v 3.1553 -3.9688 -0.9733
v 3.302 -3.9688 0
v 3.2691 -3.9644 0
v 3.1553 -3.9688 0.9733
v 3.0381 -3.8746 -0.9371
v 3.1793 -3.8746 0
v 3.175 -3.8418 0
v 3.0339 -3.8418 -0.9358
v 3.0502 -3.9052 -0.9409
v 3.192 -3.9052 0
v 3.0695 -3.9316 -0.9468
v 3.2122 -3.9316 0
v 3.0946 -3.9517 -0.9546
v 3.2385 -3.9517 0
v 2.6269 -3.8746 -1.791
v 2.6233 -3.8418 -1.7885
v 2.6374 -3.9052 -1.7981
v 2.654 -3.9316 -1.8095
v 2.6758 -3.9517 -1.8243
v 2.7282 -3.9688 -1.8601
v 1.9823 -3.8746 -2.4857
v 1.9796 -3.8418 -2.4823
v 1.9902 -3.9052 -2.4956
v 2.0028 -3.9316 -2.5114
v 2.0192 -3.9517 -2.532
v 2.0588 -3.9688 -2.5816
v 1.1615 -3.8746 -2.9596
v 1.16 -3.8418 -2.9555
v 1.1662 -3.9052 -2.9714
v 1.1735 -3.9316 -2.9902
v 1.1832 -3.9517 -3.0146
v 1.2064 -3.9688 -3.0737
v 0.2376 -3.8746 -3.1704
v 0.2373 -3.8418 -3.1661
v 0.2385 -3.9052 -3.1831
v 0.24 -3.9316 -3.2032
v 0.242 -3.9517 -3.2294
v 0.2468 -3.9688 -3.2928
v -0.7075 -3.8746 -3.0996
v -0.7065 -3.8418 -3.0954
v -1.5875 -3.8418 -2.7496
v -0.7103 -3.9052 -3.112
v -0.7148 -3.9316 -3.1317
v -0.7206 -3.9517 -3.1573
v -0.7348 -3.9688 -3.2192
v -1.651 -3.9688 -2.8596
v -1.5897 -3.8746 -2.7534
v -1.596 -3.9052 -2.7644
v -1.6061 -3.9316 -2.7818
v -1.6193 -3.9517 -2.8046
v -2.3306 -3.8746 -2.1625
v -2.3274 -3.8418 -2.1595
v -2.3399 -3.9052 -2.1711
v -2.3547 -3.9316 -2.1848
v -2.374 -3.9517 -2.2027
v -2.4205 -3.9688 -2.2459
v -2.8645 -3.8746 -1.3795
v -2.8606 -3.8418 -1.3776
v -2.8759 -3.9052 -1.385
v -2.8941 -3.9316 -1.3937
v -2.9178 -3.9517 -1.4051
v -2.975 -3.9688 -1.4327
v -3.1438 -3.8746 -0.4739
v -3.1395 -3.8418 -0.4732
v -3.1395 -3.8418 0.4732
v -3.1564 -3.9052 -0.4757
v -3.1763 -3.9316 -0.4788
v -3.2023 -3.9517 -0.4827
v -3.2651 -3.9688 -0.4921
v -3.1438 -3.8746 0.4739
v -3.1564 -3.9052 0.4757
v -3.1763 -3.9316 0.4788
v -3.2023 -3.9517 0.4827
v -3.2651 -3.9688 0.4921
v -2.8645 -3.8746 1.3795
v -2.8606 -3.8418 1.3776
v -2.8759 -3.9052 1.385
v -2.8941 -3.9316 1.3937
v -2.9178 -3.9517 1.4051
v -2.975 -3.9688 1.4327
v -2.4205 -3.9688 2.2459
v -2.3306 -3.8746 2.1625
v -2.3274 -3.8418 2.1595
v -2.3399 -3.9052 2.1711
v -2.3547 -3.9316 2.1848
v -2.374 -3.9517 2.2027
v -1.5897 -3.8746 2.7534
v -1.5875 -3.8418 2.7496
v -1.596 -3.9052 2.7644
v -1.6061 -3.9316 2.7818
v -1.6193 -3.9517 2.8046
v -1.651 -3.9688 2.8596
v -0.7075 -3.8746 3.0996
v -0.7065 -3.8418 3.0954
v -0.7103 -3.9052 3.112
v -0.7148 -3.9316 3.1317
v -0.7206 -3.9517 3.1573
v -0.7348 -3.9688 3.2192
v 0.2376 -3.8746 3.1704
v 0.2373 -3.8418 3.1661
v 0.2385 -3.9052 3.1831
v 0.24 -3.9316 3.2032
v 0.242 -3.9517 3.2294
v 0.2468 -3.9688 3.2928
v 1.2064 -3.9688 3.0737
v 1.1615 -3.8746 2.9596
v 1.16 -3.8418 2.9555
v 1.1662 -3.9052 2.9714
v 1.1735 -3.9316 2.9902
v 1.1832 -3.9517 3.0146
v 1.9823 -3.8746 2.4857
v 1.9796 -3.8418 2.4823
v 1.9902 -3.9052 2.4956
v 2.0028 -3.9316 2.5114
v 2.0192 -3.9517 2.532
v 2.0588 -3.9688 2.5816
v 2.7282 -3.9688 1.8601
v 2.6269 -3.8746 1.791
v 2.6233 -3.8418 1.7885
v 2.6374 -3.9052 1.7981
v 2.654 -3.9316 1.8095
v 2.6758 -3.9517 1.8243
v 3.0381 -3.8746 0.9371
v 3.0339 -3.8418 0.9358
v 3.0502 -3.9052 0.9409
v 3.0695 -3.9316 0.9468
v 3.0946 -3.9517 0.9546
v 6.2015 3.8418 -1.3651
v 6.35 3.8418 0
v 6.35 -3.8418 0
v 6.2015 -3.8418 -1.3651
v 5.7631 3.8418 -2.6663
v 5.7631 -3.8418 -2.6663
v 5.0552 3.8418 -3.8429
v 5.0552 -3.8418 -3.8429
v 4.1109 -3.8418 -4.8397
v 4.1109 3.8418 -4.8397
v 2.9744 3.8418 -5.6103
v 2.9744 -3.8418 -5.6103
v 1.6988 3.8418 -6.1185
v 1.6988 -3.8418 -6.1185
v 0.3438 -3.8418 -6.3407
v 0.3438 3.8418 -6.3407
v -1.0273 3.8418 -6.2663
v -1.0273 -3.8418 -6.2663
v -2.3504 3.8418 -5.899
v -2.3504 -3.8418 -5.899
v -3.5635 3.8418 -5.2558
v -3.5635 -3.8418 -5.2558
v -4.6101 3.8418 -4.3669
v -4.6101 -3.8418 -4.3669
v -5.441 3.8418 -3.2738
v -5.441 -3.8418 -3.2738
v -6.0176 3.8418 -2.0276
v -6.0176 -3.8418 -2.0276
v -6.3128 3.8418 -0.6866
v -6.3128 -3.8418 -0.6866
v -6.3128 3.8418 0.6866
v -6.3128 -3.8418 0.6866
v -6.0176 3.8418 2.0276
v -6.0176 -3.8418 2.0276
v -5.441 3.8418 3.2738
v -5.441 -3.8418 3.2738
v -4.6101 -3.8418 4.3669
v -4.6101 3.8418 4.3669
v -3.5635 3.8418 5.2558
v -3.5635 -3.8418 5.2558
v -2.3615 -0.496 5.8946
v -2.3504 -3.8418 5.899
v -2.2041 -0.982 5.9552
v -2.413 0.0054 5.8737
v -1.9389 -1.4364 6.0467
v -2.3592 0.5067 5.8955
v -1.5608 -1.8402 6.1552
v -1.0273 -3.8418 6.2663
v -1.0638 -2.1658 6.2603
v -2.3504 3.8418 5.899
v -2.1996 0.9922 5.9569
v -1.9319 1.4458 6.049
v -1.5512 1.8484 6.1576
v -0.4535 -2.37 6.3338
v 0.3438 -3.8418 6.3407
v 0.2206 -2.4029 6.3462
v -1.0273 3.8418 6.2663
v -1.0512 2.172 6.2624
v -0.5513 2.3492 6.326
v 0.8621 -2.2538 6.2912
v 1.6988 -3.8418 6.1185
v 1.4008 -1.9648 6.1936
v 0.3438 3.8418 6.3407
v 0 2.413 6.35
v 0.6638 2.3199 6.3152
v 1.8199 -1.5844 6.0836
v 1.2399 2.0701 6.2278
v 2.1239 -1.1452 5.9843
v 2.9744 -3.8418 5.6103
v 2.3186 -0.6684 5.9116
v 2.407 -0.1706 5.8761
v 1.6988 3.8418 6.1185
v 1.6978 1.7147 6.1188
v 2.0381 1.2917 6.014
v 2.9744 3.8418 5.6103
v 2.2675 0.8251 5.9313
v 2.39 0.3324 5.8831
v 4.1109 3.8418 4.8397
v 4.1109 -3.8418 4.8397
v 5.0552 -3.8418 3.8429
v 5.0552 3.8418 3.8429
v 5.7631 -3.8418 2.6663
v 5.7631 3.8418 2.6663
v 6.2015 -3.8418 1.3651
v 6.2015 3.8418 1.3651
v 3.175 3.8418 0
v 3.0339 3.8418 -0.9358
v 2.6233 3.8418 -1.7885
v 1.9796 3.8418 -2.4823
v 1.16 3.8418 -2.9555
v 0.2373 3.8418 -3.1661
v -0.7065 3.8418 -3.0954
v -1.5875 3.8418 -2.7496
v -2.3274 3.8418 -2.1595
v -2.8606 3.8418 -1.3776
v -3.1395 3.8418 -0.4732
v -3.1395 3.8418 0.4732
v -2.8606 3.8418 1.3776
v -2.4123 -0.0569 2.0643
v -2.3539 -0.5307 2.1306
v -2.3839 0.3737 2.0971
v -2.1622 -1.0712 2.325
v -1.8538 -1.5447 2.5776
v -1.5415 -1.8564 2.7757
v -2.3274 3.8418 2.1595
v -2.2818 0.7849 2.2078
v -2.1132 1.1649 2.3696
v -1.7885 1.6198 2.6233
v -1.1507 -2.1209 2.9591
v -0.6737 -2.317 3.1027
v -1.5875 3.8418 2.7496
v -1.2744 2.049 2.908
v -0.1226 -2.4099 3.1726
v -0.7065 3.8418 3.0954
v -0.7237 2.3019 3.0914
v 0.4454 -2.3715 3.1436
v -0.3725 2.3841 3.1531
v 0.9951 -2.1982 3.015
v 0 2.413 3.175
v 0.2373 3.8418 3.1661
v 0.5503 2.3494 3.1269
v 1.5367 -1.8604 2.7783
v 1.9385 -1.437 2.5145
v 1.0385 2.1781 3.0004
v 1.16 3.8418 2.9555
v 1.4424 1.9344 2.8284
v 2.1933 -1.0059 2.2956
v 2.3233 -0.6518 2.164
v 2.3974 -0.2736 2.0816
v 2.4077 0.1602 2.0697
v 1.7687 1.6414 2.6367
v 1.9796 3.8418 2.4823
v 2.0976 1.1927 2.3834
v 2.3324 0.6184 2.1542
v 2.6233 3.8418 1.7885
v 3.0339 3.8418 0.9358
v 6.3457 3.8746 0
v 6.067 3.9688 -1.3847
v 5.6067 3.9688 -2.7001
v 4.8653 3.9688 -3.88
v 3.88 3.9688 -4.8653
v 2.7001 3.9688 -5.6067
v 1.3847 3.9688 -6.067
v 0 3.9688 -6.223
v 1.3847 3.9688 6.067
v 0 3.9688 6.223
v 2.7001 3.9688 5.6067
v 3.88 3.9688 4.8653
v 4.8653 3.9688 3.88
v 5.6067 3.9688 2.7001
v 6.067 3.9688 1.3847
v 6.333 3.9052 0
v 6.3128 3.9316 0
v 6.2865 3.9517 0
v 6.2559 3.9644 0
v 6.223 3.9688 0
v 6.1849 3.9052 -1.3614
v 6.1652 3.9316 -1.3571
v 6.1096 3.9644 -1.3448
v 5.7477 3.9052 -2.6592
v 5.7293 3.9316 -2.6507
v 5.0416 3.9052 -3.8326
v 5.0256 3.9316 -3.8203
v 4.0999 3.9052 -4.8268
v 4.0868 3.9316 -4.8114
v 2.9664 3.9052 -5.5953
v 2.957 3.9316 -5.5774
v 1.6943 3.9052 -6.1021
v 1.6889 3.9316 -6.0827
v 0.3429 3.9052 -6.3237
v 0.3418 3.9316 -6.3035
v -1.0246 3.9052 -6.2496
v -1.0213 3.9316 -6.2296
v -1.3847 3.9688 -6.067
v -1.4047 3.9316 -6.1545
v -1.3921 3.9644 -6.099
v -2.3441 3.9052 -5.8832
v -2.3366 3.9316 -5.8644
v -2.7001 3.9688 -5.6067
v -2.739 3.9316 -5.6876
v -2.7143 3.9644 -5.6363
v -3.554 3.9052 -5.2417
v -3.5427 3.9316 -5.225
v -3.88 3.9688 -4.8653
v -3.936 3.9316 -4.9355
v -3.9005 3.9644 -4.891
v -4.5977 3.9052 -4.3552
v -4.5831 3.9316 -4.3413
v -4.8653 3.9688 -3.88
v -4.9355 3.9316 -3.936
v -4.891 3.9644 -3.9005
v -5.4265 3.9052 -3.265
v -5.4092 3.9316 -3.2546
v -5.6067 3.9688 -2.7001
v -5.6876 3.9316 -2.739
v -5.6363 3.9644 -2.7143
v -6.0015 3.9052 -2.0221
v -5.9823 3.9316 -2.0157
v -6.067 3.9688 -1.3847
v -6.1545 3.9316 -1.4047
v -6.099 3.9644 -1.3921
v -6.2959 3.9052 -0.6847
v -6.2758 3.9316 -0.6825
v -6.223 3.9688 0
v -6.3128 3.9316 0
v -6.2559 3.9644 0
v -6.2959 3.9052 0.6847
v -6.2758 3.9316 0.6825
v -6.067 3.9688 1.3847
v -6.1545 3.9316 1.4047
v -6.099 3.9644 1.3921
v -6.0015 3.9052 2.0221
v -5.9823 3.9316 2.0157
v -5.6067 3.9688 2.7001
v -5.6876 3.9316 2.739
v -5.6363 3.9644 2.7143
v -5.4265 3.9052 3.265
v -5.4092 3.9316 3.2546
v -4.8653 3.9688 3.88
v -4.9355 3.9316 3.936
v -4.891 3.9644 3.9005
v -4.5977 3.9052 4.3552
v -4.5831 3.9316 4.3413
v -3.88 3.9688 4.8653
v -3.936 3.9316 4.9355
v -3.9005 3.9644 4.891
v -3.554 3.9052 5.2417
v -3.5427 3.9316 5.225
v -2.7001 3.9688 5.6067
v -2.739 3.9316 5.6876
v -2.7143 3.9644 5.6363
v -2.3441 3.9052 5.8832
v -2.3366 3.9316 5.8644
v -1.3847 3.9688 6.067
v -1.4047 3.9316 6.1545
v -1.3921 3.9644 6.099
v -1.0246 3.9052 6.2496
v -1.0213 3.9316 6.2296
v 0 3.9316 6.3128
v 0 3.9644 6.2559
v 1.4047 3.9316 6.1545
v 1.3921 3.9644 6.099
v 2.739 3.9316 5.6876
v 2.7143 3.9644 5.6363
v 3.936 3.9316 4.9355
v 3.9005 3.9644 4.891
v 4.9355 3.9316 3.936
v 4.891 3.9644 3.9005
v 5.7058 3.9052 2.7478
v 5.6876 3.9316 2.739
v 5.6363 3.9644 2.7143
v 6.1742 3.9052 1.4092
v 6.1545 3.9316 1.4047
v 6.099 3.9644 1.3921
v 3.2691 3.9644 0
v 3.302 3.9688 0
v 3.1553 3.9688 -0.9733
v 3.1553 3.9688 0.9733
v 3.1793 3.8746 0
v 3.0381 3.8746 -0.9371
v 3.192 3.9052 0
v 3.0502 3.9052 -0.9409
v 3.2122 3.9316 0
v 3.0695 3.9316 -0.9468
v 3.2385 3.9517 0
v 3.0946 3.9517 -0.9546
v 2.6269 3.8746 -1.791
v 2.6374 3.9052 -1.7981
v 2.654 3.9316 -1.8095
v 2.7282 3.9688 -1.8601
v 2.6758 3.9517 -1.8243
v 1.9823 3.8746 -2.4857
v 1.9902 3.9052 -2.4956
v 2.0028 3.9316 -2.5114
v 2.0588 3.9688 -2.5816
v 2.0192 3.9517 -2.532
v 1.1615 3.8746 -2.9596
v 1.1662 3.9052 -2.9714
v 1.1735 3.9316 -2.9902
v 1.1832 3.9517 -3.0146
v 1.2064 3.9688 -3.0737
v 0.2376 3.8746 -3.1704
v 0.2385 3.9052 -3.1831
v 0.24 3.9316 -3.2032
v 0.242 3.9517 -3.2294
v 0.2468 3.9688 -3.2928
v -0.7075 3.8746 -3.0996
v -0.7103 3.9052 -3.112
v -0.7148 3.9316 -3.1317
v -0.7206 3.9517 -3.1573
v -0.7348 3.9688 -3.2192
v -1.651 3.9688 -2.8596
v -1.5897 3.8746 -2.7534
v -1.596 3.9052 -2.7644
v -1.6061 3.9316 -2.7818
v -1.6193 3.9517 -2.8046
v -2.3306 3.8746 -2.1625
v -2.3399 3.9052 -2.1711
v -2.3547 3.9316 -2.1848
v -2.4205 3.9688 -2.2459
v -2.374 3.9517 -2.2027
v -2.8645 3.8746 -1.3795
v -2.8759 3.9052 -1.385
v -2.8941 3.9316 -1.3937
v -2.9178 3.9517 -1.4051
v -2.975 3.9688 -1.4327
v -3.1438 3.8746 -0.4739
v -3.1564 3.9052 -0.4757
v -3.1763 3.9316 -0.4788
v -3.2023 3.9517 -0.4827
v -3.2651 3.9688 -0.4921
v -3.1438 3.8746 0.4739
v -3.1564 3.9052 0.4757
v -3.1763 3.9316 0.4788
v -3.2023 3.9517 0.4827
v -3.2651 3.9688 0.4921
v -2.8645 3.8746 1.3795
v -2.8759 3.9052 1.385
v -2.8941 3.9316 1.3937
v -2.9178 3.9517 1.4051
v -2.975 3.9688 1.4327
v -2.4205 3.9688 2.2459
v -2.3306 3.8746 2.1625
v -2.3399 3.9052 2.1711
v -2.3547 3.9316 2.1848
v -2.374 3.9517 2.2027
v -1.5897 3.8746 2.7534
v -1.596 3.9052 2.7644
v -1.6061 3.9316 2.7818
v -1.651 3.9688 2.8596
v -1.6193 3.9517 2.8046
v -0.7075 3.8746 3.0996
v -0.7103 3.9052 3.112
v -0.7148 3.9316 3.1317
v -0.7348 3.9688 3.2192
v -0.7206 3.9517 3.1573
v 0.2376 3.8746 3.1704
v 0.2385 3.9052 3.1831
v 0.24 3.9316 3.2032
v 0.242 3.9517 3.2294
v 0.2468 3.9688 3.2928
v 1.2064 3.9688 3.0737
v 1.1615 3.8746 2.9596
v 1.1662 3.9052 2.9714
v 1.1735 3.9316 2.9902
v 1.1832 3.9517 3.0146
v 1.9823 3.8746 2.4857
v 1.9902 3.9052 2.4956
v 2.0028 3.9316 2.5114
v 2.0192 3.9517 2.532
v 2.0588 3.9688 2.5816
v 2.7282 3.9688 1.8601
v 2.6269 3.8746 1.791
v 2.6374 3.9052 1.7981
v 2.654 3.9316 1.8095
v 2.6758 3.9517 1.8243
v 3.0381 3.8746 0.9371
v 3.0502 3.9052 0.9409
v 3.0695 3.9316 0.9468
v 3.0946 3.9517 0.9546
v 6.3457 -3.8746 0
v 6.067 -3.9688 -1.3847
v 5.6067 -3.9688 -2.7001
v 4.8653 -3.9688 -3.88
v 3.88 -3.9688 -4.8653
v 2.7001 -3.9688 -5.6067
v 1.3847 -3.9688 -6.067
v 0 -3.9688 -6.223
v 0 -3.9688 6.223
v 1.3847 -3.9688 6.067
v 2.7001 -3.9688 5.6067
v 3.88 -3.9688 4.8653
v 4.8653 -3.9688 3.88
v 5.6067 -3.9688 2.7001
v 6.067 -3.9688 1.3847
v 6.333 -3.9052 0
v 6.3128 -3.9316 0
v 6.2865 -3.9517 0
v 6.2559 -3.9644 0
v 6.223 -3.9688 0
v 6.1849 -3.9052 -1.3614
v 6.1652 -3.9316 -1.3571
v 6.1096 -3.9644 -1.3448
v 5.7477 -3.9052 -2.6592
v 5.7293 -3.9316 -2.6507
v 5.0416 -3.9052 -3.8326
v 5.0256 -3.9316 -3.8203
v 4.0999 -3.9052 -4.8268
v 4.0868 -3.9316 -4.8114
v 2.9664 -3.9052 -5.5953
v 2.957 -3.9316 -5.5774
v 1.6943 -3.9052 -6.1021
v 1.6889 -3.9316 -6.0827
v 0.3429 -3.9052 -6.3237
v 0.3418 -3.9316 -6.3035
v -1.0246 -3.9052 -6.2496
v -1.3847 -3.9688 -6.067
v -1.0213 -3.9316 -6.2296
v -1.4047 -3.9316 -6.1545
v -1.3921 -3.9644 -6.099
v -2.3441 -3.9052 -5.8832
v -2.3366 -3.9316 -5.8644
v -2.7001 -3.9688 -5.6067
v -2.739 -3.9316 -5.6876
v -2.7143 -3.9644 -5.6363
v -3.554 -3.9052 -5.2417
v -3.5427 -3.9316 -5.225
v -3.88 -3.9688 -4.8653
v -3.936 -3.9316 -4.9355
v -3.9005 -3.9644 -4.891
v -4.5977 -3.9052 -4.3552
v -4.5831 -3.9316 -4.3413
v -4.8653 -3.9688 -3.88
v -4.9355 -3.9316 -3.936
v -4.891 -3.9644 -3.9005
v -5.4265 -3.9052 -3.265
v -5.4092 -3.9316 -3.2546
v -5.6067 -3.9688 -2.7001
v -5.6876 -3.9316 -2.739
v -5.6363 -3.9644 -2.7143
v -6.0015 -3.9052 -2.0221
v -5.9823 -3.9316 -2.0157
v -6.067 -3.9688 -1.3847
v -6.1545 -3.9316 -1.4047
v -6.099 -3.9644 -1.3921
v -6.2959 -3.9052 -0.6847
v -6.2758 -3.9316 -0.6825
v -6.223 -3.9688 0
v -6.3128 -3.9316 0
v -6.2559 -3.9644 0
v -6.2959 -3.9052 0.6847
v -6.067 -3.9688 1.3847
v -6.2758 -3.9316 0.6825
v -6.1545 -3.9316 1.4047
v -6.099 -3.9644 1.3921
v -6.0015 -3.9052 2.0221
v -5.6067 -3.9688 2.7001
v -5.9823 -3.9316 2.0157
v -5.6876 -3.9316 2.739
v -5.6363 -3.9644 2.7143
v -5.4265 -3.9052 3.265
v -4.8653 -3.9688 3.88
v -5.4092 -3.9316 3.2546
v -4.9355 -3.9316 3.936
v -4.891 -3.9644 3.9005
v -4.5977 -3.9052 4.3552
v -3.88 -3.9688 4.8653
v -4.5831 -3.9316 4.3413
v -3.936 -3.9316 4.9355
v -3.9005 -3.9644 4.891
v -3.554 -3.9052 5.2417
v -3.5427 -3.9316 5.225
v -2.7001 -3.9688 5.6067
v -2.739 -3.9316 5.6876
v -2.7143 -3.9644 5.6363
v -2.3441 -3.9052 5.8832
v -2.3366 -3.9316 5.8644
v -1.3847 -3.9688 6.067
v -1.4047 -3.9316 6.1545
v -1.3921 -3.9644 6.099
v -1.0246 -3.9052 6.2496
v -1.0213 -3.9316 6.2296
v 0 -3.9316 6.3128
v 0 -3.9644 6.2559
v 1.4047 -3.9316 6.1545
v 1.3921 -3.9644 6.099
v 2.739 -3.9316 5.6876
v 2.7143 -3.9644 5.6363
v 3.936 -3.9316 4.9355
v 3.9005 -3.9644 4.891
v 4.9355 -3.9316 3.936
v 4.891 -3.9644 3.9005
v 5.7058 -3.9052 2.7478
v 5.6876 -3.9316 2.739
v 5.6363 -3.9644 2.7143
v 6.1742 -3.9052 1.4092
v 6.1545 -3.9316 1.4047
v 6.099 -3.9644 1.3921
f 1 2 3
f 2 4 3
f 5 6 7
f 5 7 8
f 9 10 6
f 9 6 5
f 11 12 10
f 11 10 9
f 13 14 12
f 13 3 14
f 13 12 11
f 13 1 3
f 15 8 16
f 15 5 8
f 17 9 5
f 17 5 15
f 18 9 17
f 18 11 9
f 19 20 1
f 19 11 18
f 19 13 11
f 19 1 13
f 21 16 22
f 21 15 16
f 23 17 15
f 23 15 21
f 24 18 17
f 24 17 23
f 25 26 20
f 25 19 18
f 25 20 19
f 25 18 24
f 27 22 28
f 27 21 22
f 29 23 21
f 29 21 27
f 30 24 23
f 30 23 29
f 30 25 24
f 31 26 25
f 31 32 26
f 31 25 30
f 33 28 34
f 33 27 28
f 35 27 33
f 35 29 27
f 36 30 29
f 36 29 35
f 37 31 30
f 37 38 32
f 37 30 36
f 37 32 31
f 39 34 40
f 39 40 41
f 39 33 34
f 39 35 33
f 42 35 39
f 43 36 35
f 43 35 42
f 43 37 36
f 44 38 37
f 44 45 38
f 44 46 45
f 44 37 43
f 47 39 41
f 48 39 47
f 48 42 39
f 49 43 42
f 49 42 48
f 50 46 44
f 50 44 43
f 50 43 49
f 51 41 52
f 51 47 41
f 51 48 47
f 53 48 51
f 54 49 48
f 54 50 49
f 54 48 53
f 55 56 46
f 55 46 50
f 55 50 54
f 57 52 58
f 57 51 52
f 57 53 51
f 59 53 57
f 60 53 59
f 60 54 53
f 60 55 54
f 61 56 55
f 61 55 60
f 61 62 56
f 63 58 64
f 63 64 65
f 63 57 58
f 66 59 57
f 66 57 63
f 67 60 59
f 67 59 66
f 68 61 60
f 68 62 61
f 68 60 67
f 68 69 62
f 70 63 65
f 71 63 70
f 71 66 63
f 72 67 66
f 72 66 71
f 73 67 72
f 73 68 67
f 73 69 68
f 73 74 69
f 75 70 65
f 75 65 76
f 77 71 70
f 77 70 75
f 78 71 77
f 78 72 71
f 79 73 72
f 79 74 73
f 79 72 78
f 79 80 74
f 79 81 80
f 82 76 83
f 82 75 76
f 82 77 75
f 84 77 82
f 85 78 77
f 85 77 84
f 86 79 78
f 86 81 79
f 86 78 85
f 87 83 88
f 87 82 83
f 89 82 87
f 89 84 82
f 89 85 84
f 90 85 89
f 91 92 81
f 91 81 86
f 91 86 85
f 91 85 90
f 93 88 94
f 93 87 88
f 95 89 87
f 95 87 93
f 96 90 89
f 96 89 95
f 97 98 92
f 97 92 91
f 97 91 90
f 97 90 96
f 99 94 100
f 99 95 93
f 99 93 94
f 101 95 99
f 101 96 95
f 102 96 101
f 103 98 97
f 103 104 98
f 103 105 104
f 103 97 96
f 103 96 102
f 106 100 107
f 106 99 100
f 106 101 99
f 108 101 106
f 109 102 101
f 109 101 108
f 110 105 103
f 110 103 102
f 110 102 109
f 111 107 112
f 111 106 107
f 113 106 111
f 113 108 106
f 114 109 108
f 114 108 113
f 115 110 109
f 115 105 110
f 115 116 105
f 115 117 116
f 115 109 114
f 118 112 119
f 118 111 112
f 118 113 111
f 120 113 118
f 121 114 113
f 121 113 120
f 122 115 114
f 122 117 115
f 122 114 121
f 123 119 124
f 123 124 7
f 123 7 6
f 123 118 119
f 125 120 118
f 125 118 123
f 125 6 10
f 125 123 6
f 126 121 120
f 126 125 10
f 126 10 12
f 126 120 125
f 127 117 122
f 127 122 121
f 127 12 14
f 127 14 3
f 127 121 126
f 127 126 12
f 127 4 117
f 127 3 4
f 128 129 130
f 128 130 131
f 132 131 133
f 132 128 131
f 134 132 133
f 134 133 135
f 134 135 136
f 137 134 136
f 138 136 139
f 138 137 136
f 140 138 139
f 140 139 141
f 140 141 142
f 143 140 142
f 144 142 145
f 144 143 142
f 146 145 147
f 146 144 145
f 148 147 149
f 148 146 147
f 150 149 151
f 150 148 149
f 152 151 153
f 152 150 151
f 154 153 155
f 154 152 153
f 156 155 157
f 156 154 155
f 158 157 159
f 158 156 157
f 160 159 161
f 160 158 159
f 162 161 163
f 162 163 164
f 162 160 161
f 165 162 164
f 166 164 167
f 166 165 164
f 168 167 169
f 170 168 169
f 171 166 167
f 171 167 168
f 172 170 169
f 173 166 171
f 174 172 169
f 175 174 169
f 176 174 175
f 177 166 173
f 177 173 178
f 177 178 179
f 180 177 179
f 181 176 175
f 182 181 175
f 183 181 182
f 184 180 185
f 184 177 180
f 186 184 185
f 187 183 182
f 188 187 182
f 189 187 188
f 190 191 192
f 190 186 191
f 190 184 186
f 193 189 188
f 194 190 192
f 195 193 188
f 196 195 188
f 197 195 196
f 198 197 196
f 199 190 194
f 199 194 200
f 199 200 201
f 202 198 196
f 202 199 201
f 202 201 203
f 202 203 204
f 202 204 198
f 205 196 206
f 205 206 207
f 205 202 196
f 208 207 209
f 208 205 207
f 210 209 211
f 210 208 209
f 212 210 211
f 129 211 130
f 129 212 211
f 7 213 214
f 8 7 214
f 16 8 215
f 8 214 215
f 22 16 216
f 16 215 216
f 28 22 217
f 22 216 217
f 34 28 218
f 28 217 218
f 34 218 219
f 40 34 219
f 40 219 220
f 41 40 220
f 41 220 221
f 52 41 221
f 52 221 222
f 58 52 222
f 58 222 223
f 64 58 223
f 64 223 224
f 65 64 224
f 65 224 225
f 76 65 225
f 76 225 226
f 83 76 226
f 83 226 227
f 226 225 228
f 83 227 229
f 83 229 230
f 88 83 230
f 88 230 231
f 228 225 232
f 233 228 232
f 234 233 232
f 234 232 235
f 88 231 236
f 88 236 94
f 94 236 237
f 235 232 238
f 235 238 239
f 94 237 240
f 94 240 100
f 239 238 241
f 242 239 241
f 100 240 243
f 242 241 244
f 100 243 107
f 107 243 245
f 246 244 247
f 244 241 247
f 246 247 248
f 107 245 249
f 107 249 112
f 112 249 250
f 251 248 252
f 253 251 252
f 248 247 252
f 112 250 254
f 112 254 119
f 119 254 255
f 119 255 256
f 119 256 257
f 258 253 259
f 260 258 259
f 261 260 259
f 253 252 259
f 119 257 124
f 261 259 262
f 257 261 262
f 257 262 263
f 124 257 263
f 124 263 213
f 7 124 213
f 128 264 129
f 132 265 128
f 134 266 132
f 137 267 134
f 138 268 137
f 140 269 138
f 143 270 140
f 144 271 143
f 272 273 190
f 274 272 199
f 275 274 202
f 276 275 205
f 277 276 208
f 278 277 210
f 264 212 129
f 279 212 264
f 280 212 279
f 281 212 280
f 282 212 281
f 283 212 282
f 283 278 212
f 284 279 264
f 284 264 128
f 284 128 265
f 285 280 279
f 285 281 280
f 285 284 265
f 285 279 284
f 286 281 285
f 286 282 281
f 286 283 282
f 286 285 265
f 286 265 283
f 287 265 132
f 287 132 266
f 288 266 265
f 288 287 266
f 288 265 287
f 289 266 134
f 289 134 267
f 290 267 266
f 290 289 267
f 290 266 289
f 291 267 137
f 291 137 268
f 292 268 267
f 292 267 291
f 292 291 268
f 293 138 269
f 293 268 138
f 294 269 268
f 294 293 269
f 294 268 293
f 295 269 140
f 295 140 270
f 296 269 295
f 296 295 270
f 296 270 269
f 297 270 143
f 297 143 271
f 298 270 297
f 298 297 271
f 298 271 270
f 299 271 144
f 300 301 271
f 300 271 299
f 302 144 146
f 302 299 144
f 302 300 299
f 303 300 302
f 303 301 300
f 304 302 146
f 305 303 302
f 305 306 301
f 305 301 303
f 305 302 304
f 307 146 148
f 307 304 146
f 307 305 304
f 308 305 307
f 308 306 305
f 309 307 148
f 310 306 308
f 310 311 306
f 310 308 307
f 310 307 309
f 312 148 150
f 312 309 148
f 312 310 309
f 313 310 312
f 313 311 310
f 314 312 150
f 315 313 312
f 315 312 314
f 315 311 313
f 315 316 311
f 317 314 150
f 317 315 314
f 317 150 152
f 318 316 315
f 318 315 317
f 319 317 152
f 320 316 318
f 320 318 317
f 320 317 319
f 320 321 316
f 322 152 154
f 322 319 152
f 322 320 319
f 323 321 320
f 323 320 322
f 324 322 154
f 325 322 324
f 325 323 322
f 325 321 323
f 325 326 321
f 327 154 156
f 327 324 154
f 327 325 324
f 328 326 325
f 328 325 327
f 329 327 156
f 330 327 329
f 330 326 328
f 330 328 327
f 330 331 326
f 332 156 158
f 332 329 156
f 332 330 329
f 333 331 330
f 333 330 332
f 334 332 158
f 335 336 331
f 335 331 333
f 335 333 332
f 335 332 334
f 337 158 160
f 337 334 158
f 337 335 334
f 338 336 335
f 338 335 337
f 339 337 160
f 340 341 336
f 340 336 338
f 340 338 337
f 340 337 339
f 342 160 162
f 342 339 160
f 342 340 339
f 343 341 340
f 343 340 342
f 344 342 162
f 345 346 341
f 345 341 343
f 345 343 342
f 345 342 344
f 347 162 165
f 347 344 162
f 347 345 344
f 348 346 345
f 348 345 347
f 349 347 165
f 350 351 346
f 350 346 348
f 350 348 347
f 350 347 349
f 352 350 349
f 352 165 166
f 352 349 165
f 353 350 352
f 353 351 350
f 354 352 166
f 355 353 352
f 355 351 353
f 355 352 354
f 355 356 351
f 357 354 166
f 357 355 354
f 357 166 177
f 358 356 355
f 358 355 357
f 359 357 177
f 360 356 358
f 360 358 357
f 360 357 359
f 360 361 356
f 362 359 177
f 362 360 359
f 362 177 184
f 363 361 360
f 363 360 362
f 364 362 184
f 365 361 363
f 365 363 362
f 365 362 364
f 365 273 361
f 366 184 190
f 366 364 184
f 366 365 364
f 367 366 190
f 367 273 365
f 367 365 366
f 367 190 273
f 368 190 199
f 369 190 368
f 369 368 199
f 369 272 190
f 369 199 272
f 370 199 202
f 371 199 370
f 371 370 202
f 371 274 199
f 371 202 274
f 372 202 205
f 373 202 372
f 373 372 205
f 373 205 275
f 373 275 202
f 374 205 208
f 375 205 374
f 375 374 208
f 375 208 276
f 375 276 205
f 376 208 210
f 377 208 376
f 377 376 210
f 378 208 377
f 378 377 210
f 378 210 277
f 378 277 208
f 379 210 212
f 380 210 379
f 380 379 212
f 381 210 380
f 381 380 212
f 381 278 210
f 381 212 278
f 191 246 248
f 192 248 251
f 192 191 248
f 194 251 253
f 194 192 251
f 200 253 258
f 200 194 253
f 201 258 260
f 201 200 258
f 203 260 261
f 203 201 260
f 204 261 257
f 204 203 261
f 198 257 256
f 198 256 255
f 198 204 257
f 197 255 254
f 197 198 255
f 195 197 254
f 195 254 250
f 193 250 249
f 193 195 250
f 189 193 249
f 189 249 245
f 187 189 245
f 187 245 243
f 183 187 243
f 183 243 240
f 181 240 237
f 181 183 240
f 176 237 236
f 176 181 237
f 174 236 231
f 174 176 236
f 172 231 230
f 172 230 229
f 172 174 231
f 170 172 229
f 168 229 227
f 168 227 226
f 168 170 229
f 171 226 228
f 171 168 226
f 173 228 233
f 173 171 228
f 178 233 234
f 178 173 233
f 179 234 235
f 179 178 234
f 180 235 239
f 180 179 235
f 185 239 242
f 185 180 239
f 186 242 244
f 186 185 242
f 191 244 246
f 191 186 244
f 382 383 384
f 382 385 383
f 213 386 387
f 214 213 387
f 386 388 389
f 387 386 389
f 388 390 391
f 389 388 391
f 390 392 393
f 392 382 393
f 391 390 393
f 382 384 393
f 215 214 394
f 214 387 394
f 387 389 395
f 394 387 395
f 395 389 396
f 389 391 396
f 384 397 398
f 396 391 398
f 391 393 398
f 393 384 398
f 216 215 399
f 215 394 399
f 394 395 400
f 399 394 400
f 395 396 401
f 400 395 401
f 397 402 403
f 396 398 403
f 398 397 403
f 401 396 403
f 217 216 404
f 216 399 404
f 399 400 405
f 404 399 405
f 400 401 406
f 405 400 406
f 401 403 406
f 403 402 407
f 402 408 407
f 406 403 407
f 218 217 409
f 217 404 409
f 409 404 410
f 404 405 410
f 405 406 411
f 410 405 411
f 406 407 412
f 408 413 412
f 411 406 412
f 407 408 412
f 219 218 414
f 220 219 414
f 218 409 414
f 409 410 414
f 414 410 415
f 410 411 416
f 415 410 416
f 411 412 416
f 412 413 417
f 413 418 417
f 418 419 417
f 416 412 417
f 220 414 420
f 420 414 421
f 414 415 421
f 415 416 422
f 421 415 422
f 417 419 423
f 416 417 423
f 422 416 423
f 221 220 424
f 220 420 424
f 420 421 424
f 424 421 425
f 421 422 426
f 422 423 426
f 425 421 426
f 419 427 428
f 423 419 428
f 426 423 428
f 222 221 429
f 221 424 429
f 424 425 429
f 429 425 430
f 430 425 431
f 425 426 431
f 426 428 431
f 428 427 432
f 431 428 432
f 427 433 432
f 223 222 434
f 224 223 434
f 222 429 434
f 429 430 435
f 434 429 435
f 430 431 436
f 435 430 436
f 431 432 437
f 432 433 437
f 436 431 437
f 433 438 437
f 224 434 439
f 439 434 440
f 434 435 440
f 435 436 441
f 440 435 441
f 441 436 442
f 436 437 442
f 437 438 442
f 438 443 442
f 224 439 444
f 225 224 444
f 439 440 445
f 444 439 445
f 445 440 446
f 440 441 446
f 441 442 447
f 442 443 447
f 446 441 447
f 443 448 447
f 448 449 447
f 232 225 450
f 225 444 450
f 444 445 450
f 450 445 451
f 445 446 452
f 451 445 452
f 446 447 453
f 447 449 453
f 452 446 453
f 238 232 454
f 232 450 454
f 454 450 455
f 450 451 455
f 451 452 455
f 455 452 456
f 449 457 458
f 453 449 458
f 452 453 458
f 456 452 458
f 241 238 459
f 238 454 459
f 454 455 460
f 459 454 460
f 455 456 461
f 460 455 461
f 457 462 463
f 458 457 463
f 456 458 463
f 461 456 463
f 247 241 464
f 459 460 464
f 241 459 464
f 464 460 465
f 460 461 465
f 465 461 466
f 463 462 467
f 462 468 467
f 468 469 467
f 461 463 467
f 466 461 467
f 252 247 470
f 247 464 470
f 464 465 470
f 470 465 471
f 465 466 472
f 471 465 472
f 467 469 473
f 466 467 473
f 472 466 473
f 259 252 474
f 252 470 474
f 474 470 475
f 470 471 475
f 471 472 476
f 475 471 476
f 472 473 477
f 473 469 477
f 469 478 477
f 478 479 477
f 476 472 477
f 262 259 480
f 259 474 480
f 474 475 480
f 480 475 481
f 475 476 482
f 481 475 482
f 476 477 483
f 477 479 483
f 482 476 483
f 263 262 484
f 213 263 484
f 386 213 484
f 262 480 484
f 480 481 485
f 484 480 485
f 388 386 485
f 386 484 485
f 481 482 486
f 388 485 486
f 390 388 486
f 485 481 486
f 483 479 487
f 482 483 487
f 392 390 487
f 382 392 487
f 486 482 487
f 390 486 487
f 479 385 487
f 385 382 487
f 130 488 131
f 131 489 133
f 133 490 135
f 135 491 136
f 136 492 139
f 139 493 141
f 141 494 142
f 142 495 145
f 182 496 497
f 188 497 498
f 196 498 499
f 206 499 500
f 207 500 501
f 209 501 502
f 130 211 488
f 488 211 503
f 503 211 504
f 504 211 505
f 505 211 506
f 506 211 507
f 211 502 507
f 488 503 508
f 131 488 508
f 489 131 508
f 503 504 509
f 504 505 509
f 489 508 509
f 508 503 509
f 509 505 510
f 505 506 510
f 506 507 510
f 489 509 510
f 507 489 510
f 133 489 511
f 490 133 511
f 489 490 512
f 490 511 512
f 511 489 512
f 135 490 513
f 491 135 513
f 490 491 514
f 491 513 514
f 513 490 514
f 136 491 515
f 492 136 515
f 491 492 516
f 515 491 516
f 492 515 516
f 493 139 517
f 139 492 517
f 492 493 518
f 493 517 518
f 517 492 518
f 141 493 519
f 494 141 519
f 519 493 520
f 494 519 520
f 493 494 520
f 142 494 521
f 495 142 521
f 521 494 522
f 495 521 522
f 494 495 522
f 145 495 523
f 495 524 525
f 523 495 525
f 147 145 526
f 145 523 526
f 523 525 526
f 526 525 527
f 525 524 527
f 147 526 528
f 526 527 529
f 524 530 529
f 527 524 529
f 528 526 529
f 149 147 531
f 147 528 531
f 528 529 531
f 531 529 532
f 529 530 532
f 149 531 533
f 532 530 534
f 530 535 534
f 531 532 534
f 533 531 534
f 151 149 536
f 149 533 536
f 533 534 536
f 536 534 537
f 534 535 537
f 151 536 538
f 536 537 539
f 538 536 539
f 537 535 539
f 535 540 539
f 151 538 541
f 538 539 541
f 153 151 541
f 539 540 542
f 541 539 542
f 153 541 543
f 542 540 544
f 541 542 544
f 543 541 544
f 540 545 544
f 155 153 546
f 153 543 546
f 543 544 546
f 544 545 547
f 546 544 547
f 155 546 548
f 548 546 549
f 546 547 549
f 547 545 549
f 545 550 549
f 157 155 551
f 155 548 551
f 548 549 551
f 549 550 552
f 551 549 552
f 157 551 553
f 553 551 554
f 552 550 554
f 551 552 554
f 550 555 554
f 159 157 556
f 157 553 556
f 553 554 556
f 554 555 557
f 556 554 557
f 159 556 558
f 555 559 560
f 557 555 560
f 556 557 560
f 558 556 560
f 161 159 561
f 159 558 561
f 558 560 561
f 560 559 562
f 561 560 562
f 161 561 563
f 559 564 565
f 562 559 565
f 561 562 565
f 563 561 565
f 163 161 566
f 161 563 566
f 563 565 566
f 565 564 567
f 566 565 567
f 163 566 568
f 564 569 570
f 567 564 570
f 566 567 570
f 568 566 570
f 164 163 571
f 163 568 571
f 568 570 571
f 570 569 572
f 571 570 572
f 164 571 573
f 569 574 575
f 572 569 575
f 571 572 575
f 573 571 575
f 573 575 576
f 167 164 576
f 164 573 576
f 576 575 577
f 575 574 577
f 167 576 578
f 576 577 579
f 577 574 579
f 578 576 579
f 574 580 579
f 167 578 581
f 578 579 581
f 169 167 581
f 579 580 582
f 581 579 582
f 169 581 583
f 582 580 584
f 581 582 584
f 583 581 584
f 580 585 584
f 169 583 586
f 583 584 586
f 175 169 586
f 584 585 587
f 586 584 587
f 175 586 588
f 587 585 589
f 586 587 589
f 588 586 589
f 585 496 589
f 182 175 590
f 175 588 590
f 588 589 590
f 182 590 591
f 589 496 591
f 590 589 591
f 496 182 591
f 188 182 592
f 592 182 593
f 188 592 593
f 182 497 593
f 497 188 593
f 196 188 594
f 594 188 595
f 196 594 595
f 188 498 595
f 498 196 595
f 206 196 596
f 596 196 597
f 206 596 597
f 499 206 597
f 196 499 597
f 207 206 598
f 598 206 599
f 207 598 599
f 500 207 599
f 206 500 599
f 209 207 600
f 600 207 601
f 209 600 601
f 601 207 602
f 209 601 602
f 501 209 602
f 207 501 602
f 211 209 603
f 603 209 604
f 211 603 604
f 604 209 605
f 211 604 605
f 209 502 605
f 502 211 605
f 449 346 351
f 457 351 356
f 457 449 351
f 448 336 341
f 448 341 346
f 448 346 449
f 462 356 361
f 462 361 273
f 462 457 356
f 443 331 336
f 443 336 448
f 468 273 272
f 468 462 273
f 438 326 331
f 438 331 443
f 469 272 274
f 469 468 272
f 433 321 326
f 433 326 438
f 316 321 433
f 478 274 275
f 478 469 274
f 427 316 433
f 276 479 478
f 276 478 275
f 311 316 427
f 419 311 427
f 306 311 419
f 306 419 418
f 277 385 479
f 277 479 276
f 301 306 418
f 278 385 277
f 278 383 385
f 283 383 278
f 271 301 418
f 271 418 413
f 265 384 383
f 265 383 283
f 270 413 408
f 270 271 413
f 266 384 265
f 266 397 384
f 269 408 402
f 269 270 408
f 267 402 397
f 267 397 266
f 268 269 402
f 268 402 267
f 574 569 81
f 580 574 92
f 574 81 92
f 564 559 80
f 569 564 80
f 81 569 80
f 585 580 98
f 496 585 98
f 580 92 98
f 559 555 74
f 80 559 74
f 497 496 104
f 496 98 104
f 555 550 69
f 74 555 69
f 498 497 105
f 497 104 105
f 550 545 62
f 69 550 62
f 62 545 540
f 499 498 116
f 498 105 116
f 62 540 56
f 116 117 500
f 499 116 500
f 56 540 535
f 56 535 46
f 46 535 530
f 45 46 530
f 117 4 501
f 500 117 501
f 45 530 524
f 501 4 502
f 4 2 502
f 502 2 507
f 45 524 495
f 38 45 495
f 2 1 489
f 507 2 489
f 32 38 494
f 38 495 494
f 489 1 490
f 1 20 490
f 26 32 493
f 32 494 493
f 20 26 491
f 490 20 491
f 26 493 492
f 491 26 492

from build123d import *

# Parameters (mm, degrees)
SKETCH_1_W          = 6.35
SKETCH_1_H          = 7.9375
HOLE_WIZARD_1_D     = 6.35
HOLE_WIZARD_1_DEPTH = 7.9375
SKETCH_4_W          = 2.413
SKETCH_4_H          = 4.286494245
FILLET_1_R          = 0.127


with BuildPart() as part:
    # 草图1 → 旋转1 (revolve)
    with BuildSketch(Plane(origin=(0, 0, 0), x_dir=(-1, 0, 0), z_dir=(0, 0, -1))):
        with Locations((-3.175, 0)):
            Rectangle(SKETCH_1_W, SKETCH_1_H)
    revolve(axis=Axis((0, -3.96875, 0), (0, 1, 0)))

    # 孔1
    with Locations(Plane(origin=(0, -3.96875, 0), x_dir=(-1, 0, 0), z_dir=(0, -1, 0))):
        with Locations((0, 0)):
            Hole(HOLE_WIZARD_1_D / 2, depth=HOLE_WIZARD_1_DEPTH)

    # 草图4 → 孔2 (revolve, cut)
    with BuildSketch(Plane(origin=(0, 0, 2.063505755), x_dir=(0, 1, 0), z_dir=(1, 0, 0))):
        with Locations((1.2065, 2.143247123)):
            Rectangle(SKETCH_4_W, SKETCH_4_H)
    revolve(axis=Axis((0, 0, 112.063505755), (0, 0, -1)), mode=Mode.SUBTRACT)

    # 圆角1
    fillet_1_edges = [part.edges().sort_by_distance(p)[0] for p in [
        (-3.175, -3.96875, 0),
        (-3.175, 3.96875, 0),
        (-6.35, 3.96875, 0),
        (-6.35, -3.96875, 0),
    ]]
    fillet(fillet_1_edges, radius=FILLET_1_R)


solid = part.part
